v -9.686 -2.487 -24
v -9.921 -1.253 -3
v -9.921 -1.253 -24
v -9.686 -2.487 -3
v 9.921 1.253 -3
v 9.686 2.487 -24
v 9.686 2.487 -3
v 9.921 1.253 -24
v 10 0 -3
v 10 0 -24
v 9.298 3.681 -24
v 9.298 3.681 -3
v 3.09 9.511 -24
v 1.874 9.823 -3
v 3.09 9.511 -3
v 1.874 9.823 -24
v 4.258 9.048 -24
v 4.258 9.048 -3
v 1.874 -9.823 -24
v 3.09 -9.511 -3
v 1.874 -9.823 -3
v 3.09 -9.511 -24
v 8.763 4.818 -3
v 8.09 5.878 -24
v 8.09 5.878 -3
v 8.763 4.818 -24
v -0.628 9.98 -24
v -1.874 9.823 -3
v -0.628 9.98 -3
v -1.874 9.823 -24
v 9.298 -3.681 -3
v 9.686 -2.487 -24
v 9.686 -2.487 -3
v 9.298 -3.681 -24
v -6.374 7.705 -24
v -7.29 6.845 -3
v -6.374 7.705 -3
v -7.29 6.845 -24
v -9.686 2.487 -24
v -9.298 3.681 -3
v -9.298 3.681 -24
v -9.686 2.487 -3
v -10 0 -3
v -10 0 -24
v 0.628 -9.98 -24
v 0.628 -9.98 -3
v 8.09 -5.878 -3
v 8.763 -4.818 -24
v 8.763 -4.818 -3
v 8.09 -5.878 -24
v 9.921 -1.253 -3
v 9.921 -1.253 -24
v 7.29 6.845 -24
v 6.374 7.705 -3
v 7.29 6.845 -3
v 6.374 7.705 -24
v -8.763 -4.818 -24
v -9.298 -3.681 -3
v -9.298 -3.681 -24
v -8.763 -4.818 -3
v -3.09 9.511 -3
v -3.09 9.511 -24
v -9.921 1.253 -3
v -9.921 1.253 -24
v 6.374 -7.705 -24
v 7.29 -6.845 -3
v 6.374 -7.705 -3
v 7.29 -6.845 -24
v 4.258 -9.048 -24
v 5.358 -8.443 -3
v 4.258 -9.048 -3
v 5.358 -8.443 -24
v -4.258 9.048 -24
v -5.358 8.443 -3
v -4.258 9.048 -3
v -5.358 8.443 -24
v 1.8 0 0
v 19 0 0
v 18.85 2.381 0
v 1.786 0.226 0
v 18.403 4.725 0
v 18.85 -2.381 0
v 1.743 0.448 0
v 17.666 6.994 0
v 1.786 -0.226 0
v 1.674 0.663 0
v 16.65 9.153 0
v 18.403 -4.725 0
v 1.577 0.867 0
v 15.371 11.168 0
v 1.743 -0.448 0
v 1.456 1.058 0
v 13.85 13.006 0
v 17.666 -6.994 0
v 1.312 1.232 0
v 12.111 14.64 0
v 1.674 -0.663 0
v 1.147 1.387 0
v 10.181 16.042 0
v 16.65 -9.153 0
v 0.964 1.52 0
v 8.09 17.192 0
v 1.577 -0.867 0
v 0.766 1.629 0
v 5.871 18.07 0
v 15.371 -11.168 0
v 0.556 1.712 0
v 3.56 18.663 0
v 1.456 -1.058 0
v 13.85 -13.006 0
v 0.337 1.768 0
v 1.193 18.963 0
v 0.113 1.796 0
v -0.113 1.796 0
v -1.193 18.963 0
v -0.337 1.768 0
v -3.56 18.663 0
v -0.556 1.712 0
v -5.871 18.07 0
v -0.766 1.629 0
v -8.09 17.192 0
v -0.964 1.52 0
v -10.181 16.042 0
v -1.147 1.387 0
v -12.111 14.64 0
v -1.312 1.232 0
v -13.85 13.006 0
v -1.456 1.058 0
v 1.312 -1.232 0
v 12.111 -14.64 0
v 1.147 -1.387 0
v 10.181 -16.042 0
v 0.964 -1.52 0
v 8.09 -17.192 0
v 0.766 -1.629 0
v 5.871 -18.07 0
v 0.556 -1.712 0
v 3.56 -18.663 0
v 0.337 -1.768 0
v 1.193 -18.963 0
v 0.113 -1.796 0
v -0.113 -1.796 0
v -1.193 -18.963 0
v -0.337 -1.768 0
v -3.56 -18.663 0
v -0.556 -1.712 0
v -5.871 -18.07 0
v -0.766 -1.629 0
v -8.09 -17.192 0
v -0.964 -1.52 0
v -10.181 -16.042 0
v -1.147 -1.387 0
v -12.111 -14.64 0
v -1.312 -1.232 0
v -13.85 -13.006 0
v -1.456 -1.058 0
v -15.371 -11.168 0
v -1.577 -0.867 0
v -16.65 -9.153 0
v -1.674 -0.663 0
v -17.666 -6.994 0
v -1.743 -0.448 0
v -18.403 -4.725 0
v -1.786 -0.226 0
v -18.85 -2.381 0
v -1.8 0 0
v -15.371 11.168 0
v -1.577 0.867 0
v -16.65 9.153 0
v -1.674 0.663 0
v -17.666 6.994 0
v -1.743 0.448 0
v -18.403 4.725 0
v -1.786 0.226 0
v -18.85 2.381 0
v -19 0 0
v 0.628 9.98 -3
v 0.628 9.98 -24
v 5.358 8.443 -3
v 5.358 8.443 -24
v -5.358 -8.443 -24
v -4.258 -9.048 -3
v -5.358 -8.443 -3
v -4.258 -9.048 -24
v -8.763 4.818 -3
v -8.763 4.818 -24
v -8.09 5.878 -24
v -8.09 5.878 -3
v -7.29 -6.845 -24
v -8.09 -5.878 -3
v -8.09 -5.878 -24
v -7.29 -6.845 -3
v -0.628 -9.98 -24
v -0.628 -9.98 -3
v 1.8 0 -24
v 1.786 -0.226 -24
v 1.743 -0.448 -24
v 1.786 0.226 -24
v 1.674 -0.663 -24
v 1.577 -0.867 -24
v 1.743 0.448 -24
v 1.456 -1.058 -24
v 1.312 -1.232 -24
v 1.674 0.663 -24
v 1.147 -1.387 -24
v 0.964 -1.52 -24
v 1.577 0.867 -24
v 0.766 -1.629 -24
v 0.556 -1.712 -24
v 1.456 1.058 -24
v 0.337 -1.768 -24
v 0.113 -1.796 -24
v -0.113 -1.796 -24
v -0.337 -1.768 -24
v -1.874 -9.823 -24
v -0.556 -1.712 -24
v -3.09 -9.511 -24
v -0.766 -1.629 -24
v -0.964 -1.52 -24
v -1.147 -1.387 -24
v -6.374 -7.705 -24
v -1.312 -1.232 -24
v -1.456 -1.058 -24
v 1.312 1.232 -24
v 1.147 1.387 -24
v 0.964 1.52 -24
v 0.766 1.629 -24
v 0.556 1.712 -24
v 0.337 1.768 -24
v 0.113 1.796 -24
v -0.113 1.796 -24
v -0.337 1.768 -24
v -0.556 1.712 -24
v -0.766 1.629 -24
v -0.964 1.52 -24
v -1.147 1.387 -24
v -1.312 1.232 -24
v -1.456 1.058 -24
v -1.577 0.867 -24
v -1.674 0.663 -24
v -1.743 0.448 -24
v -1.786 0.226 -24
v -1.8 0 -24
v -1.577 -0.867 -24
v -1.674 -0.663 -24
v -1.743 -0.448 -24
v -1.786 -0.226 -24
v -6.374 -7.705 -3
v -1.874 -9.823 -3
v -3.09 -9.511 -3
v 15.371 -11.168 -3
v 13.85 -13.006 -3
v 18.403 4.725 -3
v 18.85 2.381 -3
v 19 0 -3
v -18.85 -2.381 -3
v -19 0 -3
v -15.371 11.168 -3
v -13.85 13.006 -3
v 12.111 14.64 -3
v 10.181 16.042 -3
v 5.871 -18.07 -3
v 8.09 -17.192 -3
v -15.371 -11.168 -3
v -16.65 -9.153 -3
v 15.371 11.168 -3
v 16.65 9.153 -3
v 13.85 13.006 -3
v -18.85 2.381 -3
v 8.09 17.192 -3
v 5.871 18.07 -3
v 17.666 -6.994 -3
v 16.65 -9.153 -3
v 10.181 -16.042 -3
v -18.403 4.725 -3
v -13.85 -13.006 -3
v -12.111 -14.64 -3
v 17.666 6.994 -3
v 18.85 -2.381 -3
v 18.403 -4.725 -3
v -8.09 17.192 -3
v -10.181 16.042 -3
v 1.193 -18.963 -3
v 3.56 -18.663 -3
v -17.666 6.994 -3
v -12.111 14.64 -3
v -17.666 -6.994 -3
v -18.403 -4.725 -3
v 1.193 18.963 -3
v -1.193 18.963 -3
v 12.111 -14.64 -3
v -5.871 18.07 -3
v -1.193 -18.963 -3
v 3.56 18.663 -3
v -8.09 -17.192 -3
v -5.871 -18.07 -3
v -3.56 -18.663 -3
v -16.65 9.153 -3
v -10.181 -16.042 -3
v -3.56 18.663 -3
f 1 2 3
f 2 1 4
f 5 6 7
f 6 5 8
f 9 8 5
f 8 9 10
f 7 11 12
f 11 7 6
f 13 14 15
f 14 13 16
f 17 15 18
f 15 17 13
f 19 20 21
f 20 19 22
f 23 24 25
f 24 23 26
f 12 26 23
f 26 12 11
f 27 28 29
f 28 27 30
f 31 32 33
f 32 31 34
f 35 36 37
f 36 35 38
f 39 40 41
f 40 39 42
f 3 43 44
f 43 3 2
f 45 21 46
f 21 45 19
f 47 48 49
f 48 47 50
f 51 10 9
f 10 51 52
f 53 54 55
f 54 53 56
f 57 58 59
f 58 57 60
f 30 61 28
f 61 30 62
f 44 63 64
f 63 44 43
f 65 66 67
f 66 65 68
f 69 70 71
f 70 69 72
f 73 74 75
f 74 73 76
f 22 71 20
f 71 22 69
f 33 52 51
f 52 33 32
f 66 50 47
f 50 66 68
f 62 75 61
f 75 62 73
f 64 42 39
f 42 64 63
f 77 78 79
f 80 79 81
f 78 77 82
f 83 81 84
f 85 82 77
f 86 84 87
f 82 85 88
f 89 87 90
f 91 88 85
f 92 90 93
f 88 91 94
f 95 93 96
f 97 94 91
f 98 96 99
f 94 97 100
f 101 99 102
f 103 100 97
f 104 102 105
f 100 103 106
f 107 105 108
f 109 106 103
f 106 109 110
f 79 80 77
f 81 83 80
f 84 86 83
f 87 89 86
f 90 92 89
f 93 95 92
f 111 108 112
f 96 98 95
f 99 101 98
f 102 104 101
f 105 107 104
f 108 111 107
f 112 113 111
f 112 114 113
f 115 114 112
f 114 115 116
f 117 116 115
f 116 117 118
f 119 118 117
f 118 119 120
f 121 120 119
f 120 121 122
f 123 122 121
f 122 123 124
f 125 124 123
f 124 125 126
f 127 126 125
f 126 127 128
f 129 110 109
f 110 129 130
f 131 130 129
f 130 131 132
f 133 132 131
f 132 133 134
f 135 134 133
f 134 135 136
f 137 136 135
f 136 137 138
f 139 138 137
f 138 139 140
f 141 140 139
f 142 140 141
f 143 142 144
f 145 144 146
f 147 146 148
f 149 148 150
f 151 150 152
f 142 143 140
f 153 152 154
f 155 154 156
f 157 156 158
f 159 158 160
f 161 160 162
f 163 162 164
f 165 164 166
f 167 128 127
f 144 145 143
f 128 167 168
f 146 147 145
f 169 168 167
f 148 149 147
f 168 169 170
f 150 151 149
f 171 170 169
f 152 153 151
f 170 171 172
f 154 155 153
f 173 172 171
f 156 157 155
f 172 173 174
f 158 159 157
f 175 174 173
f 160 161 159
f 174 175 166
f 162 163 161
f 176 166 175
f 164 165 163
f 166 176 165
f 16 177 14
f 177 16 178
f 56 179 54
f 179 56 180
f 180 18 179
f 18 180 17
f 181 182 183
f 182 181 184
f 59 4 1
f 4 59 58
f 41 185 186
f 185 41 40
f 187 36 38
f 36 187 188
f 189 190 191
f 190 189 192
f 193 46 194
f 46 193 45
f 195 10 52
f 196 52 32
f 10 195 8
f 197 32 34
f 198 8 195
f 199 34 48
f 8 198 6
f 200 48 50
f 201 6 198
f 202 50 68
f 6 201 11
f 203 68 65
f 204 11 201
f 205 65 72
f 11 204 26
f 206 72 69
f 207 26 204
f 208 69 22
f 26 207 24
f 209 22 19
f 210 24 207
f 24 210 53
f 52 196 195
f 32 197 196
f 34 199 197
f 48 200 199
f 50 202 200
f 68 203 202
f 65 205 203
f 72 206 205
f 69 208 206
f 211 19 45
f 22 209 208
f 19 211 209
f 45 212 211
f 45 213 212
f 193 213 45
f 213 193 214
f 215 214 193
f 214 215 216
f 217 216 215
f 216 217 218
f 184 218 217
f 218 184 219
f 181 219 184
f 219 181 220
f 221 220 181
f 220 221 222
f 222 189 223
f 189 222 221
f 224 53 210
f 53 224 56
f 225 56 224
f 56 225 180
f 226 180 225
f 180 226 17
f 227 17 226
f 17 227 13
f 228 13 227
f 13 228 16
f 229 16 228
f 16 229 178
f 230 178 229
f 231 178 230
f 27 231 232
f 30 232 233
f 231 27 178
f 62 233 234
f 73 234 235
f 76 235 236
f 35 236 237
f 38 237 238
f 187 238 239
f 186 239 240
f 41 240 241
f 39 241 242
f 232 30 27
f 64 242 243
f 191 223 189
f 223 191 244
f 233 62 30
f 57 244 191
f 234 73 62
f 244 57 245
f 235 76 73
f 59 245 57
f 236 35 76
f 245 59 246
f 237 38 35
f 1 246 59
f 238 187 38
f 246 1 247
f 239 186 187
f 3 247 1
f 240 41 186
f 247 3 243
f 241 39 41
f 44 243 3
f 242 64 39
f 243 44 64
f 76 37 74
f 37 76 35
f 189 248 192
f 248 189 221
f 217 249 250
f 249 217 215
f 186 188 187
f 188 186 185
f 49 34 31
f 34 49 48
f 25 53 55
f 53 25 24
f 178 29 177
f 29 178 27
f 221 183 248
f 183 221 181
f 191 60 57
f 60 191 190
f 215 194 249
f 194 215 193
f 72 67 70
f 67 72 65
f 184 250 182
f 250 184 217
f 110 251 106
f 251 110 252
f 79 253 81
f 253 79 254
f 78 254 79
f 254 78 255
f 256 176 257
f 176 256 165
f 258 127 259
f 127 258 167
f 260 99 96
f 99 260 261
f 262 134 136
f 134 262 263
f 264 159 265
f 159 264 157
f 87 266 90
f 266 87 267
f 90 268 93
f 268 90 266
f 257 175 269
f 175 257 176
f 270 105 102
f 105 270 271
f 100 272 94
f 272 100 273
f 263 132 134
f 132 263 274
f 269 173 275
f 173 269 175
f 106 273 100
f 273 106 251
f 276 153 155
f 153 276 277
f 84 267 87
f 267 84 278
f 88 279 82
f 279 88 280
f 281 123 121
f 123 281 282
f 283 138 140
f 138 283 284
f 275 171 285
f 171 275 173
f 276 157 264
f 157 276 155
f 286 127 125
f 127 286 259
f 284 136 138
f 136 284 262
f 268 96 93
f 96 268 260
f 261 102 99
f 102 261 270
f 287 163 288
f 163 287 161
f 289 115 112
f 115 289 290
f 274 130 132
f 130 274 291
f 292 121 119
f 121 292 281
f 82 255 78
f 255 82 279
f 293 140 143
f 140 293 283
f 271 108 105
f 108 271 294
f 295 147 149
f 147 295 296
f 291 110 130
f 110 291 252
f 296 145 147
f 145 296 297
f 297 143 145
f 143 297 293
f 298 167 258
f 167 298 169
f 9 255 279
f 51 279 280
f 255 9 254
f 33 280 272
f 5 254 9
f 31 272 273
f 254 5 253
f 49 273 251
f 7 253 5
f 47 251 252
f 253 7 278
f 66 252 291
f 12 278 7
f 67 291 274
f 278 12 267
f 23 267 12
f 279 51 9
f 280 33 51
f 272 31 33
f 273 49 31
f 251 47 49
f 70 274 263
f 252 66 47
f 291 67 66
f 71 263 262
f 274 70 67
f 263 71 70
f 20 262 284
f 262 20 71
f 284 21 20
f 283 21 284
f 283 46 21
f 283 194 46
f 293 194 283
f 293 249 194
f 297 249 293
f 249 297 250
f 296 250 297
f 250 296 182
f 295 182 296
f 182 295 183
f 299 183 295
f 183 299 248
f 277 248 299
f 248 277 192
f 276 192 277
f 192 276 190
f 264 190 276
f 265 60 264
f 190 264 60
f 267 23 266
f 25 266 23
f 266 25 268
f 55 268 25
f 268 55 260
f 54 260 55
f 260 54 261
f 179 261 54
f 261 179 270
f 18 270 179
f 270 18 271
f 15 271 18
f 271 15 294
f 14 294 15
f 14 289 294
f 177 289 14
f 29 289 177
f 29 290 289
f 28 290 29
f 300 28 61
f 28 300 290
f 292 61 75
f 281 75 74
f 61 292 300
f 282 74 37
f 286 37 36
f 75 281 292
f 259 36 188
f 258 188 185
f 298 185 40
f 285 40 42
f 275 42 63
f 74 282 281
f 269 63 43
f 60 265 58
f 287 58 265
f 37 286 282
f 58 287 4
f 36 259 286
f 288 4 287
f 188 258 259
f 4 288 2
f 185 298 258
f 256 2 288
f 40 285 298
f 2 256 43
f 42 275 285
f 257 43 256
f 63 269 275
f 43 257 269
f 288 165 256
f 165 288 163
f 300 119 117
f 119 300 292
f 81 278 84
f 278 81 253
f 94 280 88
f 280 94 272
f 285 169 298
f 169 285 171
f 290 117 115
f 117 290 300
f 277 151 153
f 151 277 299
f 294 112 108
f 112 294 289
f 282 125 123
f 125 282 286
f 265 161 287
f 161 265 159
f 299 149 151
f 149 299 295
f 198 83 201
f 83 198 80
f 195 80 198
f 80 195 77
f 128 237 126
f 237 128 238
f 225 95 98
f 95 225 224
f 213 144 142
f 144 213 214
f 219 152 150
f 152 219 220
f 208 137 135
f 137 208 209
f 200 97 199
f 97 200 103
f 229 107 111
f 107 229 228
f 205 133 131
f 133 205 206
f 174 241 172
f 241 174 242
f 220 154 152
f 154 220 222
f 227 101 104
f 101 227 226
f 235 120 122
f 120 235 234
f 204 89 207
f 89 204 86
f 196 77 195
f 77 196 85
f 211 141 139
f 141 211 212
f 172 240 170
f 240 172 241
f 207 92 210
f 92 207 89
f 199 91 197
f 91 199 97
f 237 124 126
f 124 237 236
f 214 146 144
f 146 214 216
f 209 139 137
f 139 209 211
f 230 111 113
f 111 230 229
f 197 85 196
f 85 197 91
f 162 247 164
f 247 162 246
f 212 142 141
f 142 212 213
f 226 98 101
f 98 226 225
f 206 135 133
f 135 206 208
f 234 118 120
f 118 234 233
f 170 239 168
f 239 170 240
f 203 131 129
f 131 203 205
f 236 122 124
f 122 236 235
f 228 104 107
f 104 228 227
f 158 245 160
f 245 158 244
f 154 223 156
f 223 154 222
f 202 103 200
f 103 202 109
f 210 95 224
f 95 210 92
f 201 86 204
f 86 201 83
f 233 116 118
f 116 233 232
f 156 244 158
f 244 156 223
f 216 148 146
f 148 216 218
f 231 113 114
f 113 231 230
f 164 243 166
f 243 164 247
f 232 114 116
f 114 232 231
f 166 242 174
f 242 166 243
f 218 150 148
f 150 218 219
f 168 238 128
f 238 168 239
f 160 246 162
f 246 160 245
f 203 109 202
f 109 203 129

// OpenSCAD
$fn = 50;


difference() {
	union() {
		translate(v = [0, 0, -24.0000000000]) {
			cylinder(h = 24, r = 10.0000000000);
		}
		translate(v = [0, 0, -3.0000000000]) {
			cylinder(h = 3, r = 19.0000000000);
		}
	}
	union() {
		#translate(v = [0, 0, -24]) {
			cylinder(h = 24, r = 1.8000000000);
		}
	}
}
